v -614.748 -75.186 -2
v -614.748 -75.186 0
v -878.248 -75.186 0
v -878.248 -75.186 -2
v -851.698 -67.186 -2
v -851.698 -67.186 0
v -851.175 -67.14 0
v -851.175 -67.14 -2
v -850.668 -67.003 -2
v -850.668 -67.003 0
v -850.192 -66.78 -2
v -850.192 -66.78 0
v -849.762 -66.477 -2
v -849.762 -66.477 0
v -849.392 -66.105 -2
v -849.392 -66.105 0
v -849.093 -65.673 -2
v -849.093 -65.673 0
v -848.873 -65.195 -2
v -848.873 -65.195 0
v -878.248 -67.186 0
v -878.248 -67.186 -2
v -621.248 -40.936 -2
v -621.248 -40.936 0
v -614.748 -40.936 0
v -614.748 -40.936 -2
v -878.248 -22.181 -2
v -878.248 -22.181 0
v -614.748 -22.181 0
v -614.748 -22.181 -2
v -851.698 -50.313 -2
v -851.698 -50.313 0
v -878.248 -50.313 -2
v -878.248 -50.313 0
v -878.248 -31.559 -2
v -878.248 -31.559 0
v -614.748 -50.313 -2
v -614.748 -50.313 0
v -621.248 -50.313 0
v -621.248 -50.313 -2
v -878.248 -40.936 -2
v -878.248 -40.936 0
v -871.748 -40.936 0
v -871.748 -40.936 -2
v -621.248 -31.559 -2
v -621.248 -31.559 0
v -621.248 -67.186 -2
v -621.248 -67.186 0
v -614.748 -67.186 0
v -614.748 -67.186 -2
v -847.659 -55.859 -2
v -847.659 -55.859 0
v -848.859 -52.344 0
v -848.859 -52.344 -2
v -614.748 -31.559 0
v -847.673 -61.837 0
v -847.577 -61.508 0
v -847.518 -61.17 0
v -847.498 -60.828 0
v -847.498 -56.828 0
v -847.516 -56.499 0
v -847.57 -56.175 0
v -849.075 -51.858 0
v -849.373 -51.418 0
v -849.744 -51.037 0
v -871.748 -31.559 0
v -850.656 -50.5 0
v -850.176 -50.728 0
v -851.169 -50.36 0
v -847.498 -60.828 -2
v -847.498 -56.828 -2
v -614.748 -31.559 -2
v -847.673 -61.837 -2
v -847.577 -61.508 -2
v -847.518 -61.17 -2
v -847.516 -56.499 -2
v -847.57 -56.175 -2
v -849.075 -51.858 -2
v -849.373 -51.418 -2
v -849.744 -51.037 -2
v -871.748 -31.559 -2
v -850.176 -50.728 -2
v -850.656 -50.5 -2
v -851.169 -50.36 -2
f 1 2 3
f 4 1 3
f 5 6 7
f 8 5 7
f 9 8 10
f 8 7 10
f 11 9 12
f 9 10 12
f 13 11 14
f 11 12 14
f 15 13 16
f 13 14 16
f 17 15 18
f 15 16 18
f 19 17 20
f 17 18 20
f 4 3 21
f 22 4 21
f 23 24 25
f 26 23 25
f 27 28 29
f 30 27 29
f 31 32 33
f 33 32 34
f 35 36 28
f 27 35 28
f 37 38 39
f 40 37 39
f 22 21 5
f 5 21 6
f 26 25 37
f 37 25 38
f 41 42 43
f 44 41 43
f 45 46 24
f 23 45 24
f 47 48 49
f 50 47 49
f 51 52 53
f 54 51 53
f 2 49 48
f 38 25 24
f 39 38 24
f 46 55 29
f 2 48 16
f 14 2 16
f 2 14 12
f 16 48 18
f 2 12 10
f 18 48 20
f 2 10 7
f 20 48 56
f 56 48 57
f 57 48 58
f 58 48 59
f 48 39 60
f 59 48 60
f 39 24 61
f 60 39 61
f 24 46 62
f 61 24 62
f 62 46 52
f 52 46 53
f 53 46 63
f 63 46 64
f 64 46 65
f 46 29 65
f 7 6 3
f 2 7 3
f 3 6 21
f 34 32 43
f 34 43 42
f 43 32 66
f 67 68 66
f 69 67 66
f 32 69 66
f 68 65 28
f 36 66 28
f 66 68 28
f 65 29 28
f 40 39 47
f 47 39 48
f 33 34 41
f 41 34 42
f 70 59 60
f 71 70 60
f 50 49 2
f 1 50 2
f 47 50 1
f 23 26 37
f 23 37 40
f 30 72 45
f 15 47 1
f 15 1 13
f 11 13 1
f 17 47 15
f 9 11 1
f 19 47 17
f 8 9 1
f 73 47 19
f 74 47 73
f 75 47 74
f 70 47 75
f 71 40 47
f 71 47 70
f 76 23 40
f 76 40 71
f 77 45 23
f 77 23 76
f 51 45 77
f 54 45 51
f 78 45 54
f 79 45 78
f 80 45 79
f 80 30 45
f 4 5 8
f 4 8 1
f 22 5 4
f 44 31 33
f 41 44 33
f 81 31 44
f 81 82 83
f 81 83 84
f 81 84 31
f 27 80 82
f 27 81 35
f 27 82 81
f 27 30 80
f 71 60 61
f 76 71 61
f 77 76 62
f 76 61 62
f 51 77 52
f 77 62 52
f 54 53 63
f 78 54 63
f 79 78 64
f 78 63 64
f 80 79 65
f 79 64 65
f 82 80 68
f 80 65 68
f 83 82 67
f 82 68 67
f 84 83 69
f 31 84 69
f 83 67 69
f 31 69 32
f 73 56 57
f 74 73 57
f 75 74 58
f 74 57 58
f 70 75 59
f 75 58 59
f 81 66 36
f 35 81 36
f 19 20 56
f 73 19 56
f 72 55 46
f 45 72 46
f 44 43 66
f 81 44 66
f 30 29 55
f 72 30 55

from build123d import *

# Parameters (mm, degrees)
BOSS_EXTRU_1_DEPTH = 2


with BuildPart() as part:
    # Esquisse1 → Boss.-Extru.1 (new body)
    with BuildSketch(Plane.XY):
        with BuildLine():
            Line((-875.748326024, -75.185778964), (-878.248326024, -75.185778964))
            Line((-878.248326024, -75.185778964), (-878.248326024, -67.185778964))
            Line((-878.248326024, -67.185778964), (-875.748326024, -67.185778964))
            Line((-875.748326024, -67.185778964), (-851.698326024, -67.185778964))
            ThreePointArc((-851.698326024, -67.185778964), (-849.970412013, -66.63818863), (-848.873290676, -65.195321078))
            Line((-848.873290676, -65.195321078), (-847.673290676, -61.837321078))
            ThreePointArc((-847.673290676, -61.837321078), (-847.542390805, -61.340074755), (-847.498326024, -60.827778964))
            Line((-847.498326024, -60.827778964), (-847.498326024, -56.827778964))
            ThreePointArc((-847.498326024, -56.827778964), (-847.538821892, -56.336520083), (-847.659216217, -55.858523838))
            Line((-847.659216217, -55.858523838), (-848.859216217, -52.343523838))
            ThreePointArc((-848.859216217, -52.343523838), (-849.95301307, -50.872721036), (-851.698326024, -50.312778964))
            Line((-851.698326024, -50.312778964), (-875.748326024, -50.312778964))
            Line((-875.748326024, -50.312778964), (-878.248326024, -50.312778964))
            Line((-878.248326024, -50.312778964), (-878.248326024, -40.935651694))
            Line((-878.248326024, -40.935651694), (-875.748326024, -40.935651694))
            Line((-875.748326024, -40.935651694), (-871.748326024, -40.935651694))
            Line((-871.748326024, -40.935651694), (-871.748326024, -31.558524425))
            Line((-871.748326024, -31.558524425), (-875.748326024, -31.558524425))
            Line((-875.748326024, -31.558524425), (-878.248326024, -31.558524425))
            Line((-878.248326024, -31.558524425), (-878.248326024, -22.181397155))
            Line((-878.248326024, -22.181397155), (-875.748326024, -22.181397155))
            Line((-875.748326024, -22.181397155), (-617.248326024, -22.181397155))
            Line((-617.248326024, -22.181397155), (-614.748326024, -22.181397155))
            Line((-614.748326024, -22.181397155), (-614.748326024, -31.558524425))
            Line((-614.748326024, -31.558524425), (-617.248326024, -31.558524425))
            Line((-617.248326024, -31.558524425), (-621.248326024, -31.558524425))
            Line((-621.248326024, -31.558524425), (-621.248326024, -40.935651694))
            Line((-621.248326024, -40.935651694), (-617.248326024, -40.935651694))
            Line((-617.248326024, -40.935651694), (-614.748326024, -40.935651694))
            Line((-614.748326024, -40.935651694), (-614.748326024, -50.312778964))
            Line((-614.748326024, -50.312778964), (-621.248326024, -50.312778964))
            Line((-621.248326024, -50.312778964), (-621.248326024, -67.185778964))
            Line((-621.248326024, -67.185778964), (-617.248326024, -67.185778964))
            Line((-617.248326024, -67.185778964), (-614.748326024, -67.185778964))
            Line((-614.748326024, -67.185778964), (-614.748326024, -75.185778964))
            Line((-614.748326024, -75.185778964), (-617.248326024, -75.185778964))
            Line((-617.248326024, -75.185778964), (-875.748326024, -75.185778964))
        make_face()
    extrude(amount=-BOSS_EXTRU_1_DEPTH)


solid = part.part
